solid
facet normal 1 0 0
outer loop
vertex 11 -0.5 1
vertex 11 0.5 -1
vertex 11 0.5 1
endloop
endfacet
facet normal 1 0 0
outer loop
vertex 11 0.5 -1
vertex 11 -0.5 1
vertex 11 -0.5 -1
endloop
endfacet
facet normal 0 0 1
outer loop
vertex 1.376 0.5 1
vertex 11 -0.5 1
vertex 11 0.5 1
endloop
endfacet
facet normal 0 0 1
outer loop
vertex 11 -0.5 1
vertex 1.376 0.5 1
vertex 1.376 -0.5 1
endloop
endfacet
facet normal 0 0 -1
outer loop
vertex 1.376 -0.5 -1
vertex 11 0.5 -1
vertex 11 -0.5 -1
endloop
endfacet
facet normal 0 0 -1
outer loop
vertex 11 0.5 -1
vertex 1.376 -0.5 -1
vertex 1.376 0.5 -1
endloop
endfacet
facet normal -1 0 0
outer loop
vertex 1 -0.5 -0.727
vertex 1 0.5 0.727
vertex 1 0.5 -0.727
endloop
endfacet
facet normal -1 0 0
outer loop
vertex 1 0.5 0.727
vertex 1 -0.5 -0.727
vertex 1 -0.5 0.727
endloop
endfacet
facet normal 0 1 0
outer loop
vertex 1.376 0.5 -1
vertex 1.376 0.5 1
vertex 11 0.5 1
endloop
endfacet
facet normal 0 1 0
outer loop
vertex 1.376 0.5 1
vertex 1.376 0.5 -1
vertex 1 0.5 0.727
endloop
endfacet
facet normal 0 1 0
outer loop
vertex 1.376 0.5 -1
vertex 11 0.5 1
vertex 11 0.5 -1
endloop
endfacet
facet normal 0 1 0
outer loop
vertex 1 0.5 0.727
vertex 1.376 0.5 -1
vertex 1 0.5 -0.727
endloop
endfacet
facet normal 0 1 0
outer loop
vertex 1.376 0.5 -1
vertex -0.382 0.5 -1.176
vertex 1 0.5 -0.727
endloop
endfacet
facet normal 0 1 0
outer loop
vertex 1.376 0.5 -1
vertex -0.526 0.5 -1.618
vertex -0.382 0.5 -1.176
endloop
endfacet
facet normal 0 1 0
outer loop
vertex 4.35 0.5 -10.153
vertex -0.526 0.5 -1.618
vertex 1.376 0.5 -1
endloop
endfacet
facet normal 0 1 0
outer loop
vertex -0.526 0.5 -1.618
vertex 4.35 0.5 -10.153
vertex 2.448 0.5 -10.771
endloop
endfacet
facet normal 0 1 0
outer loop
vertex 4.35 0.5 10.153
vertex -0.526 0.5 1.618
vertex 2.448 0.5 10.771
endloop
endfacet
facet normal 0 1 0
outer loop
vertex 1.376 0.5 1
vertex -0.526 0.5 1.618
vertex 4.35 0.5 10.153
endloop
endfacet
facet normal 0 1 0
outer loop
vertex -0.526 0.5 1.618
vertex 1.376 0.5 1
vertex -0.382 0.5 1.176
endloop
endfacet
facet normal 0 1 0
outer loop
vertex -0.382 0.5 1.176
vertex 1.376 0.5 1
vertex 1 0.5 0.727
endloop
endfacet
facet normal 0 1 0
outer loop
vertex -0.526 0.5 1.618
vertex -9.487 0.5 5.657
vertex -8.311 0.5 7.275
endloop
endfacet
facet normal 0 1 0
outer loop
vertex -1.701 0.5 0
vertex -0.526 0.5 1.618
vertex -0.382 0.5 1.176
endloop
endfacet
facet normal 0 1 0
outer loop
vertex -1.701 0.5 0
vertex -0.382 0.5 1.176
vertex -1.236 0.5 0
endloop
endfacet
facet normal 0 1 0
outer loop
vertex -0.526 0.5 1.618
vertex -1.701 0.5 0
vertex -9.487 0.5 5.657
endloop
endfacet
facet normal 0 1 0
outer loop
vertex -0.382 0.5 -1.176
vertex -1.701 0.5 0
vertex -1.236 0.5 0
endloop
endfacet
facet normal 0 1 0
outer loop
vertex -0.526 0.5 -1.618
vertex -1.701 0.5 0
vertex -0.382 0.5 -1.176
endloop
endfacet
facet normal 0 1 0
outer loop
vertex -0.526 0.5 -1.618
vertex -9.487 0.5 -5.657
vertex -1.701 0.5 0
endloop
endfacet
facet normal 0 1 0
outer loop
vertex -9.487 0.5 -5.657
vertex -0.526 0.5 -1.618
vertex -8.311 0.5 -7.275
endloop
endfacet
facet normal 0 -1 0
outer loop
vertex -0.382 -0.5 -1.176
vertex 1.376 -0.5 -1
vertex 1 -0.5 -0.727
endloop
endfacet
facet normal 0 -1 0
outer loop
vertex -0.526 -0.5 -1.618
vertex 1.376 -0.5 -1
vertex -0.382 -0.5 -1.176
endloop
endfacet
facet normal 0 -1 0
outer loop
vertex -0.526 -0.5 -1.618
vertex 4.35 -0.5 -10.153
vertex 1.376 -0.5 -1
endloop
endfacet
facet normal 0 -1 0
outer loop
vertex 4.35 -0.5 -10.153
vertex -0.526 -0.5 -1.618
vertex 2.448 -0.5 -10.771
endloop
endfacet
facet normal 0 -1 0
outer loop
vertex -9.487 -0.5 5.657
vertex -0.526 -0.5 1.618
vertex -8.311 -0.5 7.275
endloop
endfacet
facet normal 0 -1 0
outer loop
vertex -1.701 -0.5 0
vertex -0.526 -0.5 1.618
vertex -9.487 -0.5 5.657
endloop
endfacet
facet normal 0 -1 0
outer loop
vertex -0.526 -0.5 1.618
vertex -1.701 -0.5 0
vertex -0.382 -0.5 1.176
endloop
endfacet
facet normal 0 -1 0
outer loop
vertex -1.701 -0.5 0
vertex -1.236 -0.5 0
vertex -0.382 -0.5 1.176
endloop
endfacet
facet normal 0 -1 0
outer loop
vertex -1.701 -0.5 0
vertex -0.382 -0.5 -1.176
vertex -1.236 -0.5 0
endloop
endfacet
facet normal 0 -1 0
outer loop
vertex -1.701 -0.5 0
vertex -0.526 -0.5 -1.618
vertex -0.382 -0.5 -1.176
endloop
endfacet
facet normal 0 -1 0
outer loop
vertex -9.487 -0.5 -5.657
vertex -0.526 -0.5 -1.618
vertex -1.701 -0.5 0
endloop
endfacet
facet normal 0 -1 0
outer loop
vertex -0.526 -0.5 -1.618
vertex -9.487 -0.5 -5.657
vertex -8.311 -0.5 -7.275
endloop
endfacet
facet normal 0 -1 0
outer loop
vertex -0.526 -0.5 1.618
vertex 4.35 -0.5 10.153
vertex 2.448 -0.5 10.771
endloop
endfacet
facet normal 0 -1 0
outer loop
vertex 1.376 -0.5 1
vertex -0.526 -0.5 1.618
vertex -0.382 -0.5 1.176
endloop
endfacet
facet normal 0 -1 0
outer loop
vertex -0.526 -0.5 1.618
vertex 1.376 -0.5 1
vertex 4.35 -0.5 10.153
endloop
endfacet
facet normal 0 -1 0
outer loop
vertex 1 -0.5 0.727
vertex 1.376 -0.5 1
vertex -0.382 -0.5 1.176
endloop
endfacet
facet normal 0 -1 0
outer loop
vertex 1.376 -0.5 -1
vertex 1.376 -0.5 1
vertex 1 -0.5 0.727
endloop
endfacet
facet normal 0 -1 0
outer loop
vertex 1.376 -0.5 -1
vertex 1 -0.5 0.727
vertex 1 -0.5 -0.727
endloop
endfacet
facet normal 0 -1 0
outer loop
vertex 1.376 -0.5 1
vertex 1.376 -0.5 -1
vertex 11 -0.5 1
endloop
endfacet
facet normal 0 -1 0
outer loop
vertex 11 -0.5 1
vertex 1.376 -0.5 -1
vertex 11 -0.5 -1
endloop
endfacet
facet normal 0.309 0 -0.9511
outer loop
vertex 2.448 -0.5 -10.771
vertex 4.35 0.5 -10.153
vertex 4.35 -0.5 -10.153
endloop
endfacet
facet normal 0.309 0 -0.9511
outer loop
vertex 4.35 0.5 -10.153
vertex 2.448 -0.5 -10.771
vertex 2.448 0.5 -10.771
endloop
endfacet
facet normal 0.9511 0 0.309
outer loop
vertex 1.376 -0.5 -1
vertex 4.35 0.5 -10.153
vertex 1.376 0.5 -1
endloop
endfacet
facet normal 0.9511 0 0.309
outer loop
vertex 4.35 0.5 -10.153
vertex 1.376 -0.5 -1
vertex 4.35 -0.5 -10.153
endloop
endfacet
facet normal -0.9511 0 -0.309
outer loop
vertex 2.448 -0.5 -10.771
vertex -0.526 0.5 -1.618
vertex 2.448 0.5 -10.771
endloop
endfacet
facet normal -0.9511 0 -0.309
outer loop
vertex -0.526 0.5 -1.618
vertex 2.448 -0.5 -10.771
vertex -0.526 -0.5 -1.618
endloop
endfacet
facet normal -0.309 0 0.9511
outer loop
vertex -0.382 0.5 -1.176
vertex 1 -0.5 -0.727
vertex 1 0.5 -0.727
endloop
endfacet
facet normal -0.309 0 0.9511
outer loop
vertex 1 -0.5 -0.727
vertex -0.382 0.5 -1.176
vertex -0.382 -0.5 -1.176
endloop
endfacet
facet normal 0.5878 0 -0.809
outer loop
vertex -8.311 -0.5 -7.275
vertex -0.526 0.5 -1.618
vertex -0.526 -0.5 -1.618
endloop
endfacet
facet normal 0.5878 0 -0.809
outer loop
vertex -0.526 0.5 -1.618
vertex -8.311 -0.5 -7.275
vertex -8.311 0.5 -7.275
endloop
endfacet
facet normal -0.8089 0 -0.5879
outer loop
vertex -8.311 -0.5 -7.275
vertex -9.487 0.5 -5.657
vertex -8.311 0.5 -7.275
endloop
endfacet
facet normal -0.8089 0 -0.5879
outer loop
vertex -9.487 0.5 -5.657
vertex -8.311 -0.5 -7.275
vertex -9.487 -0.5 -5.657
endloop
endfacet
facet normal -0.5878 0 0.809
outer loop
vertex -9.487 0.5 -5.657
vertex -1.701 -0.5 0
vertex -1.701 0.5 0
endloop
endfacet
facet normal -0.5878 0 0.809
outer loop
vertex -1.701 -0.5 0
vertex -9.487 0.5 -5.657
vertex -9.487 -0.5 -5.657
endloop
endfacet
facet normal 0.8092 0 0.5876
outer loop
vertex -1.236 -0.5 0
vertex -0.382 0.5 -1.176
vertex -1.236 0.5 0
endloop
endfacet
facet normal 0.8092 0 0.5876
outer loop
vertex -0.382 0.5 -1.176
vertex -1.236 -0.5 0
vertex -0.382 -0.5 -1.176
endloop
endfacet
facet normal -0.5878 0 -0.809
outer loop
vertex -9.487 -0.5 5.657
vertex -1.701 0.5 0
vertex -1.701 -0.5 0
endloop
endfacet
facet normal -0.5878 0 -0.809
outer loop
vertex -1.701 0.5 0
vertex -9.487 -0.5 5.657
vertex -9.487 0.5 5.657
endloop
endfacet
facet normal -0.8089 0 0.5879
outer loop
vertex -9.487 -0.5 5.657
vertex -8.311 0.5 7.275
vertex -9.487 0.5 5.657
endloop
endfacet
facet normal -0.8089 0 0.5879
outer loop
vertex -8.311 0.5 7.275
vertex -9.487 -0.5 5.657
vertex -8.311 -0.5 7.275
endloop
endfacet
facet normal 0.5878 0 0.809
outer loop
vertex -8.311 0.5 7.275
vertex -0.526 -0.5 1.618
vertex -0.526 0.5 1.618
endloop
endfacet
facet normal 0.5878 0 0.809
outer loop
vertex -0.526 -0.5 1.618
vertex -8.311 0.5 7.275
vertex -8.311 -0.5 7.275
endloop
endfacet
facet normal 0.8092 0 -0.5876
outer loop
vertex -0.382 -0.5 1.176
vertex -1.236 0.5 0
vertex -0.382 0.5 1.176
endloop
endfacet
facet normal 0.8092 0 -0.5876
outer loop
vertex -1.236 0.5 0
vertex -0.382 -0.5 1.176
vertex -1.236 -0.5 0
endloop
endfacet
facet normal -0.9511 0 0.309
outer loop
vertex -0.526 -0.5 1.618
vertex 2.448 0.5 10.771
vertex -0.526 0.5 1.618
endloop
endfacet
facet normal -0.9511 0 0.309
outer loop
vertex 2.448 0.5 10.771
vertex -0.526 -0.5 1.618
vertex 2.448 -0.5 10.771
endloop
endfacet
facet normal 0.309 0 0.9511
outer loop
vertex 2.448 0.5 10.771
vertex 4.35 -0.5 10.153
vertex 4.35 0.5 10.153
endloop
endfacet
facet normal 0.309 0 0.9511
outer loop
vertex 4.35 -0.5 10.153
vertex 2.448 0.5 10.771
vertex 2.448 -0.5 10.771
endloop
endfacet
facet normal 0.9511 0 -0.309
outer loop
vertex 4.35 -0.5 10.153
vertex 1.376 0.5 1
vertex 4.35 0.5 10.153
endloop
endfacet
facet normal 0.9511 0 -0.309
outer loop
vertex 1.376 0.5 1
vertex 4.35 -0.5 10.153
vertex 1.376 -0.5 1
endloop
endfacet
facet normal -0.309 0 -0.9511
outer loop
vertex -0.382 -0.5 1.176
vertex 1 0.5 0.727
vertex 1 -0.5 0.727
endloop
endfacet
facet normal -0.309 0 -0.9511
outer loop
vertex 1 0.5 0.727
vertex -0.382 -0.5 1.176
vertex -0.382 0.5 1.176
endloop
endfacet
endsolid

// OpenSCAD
union() {
    translate(v=[6, 0, 0]) {
        cube(size=[10, 1, 2], center=true);
    };
    rotate(a=[0, 72, 0]) {
        translate(v=[6, 0, 0]) {
            cube(size=[10, 1, 2], center=true);
        };
    };
    rotate(a=[0, 144, 0]) {
        translate(v=[6, 0, 0]) {
            cube(size=[10, 1, 2], center=true);
        };
    };
    rotate(a=[0, 216, 0]) {
        translate(v=[6, 0, 0]) {
            cube(size=[10, 1, 2], center=true);
        };
    };
    rotate(a=[0, 288, 0]) {
        translate(v=[6, 0, 0]) {
            cube(size=[10, 1, 2], center=true);
        };
    };
};
